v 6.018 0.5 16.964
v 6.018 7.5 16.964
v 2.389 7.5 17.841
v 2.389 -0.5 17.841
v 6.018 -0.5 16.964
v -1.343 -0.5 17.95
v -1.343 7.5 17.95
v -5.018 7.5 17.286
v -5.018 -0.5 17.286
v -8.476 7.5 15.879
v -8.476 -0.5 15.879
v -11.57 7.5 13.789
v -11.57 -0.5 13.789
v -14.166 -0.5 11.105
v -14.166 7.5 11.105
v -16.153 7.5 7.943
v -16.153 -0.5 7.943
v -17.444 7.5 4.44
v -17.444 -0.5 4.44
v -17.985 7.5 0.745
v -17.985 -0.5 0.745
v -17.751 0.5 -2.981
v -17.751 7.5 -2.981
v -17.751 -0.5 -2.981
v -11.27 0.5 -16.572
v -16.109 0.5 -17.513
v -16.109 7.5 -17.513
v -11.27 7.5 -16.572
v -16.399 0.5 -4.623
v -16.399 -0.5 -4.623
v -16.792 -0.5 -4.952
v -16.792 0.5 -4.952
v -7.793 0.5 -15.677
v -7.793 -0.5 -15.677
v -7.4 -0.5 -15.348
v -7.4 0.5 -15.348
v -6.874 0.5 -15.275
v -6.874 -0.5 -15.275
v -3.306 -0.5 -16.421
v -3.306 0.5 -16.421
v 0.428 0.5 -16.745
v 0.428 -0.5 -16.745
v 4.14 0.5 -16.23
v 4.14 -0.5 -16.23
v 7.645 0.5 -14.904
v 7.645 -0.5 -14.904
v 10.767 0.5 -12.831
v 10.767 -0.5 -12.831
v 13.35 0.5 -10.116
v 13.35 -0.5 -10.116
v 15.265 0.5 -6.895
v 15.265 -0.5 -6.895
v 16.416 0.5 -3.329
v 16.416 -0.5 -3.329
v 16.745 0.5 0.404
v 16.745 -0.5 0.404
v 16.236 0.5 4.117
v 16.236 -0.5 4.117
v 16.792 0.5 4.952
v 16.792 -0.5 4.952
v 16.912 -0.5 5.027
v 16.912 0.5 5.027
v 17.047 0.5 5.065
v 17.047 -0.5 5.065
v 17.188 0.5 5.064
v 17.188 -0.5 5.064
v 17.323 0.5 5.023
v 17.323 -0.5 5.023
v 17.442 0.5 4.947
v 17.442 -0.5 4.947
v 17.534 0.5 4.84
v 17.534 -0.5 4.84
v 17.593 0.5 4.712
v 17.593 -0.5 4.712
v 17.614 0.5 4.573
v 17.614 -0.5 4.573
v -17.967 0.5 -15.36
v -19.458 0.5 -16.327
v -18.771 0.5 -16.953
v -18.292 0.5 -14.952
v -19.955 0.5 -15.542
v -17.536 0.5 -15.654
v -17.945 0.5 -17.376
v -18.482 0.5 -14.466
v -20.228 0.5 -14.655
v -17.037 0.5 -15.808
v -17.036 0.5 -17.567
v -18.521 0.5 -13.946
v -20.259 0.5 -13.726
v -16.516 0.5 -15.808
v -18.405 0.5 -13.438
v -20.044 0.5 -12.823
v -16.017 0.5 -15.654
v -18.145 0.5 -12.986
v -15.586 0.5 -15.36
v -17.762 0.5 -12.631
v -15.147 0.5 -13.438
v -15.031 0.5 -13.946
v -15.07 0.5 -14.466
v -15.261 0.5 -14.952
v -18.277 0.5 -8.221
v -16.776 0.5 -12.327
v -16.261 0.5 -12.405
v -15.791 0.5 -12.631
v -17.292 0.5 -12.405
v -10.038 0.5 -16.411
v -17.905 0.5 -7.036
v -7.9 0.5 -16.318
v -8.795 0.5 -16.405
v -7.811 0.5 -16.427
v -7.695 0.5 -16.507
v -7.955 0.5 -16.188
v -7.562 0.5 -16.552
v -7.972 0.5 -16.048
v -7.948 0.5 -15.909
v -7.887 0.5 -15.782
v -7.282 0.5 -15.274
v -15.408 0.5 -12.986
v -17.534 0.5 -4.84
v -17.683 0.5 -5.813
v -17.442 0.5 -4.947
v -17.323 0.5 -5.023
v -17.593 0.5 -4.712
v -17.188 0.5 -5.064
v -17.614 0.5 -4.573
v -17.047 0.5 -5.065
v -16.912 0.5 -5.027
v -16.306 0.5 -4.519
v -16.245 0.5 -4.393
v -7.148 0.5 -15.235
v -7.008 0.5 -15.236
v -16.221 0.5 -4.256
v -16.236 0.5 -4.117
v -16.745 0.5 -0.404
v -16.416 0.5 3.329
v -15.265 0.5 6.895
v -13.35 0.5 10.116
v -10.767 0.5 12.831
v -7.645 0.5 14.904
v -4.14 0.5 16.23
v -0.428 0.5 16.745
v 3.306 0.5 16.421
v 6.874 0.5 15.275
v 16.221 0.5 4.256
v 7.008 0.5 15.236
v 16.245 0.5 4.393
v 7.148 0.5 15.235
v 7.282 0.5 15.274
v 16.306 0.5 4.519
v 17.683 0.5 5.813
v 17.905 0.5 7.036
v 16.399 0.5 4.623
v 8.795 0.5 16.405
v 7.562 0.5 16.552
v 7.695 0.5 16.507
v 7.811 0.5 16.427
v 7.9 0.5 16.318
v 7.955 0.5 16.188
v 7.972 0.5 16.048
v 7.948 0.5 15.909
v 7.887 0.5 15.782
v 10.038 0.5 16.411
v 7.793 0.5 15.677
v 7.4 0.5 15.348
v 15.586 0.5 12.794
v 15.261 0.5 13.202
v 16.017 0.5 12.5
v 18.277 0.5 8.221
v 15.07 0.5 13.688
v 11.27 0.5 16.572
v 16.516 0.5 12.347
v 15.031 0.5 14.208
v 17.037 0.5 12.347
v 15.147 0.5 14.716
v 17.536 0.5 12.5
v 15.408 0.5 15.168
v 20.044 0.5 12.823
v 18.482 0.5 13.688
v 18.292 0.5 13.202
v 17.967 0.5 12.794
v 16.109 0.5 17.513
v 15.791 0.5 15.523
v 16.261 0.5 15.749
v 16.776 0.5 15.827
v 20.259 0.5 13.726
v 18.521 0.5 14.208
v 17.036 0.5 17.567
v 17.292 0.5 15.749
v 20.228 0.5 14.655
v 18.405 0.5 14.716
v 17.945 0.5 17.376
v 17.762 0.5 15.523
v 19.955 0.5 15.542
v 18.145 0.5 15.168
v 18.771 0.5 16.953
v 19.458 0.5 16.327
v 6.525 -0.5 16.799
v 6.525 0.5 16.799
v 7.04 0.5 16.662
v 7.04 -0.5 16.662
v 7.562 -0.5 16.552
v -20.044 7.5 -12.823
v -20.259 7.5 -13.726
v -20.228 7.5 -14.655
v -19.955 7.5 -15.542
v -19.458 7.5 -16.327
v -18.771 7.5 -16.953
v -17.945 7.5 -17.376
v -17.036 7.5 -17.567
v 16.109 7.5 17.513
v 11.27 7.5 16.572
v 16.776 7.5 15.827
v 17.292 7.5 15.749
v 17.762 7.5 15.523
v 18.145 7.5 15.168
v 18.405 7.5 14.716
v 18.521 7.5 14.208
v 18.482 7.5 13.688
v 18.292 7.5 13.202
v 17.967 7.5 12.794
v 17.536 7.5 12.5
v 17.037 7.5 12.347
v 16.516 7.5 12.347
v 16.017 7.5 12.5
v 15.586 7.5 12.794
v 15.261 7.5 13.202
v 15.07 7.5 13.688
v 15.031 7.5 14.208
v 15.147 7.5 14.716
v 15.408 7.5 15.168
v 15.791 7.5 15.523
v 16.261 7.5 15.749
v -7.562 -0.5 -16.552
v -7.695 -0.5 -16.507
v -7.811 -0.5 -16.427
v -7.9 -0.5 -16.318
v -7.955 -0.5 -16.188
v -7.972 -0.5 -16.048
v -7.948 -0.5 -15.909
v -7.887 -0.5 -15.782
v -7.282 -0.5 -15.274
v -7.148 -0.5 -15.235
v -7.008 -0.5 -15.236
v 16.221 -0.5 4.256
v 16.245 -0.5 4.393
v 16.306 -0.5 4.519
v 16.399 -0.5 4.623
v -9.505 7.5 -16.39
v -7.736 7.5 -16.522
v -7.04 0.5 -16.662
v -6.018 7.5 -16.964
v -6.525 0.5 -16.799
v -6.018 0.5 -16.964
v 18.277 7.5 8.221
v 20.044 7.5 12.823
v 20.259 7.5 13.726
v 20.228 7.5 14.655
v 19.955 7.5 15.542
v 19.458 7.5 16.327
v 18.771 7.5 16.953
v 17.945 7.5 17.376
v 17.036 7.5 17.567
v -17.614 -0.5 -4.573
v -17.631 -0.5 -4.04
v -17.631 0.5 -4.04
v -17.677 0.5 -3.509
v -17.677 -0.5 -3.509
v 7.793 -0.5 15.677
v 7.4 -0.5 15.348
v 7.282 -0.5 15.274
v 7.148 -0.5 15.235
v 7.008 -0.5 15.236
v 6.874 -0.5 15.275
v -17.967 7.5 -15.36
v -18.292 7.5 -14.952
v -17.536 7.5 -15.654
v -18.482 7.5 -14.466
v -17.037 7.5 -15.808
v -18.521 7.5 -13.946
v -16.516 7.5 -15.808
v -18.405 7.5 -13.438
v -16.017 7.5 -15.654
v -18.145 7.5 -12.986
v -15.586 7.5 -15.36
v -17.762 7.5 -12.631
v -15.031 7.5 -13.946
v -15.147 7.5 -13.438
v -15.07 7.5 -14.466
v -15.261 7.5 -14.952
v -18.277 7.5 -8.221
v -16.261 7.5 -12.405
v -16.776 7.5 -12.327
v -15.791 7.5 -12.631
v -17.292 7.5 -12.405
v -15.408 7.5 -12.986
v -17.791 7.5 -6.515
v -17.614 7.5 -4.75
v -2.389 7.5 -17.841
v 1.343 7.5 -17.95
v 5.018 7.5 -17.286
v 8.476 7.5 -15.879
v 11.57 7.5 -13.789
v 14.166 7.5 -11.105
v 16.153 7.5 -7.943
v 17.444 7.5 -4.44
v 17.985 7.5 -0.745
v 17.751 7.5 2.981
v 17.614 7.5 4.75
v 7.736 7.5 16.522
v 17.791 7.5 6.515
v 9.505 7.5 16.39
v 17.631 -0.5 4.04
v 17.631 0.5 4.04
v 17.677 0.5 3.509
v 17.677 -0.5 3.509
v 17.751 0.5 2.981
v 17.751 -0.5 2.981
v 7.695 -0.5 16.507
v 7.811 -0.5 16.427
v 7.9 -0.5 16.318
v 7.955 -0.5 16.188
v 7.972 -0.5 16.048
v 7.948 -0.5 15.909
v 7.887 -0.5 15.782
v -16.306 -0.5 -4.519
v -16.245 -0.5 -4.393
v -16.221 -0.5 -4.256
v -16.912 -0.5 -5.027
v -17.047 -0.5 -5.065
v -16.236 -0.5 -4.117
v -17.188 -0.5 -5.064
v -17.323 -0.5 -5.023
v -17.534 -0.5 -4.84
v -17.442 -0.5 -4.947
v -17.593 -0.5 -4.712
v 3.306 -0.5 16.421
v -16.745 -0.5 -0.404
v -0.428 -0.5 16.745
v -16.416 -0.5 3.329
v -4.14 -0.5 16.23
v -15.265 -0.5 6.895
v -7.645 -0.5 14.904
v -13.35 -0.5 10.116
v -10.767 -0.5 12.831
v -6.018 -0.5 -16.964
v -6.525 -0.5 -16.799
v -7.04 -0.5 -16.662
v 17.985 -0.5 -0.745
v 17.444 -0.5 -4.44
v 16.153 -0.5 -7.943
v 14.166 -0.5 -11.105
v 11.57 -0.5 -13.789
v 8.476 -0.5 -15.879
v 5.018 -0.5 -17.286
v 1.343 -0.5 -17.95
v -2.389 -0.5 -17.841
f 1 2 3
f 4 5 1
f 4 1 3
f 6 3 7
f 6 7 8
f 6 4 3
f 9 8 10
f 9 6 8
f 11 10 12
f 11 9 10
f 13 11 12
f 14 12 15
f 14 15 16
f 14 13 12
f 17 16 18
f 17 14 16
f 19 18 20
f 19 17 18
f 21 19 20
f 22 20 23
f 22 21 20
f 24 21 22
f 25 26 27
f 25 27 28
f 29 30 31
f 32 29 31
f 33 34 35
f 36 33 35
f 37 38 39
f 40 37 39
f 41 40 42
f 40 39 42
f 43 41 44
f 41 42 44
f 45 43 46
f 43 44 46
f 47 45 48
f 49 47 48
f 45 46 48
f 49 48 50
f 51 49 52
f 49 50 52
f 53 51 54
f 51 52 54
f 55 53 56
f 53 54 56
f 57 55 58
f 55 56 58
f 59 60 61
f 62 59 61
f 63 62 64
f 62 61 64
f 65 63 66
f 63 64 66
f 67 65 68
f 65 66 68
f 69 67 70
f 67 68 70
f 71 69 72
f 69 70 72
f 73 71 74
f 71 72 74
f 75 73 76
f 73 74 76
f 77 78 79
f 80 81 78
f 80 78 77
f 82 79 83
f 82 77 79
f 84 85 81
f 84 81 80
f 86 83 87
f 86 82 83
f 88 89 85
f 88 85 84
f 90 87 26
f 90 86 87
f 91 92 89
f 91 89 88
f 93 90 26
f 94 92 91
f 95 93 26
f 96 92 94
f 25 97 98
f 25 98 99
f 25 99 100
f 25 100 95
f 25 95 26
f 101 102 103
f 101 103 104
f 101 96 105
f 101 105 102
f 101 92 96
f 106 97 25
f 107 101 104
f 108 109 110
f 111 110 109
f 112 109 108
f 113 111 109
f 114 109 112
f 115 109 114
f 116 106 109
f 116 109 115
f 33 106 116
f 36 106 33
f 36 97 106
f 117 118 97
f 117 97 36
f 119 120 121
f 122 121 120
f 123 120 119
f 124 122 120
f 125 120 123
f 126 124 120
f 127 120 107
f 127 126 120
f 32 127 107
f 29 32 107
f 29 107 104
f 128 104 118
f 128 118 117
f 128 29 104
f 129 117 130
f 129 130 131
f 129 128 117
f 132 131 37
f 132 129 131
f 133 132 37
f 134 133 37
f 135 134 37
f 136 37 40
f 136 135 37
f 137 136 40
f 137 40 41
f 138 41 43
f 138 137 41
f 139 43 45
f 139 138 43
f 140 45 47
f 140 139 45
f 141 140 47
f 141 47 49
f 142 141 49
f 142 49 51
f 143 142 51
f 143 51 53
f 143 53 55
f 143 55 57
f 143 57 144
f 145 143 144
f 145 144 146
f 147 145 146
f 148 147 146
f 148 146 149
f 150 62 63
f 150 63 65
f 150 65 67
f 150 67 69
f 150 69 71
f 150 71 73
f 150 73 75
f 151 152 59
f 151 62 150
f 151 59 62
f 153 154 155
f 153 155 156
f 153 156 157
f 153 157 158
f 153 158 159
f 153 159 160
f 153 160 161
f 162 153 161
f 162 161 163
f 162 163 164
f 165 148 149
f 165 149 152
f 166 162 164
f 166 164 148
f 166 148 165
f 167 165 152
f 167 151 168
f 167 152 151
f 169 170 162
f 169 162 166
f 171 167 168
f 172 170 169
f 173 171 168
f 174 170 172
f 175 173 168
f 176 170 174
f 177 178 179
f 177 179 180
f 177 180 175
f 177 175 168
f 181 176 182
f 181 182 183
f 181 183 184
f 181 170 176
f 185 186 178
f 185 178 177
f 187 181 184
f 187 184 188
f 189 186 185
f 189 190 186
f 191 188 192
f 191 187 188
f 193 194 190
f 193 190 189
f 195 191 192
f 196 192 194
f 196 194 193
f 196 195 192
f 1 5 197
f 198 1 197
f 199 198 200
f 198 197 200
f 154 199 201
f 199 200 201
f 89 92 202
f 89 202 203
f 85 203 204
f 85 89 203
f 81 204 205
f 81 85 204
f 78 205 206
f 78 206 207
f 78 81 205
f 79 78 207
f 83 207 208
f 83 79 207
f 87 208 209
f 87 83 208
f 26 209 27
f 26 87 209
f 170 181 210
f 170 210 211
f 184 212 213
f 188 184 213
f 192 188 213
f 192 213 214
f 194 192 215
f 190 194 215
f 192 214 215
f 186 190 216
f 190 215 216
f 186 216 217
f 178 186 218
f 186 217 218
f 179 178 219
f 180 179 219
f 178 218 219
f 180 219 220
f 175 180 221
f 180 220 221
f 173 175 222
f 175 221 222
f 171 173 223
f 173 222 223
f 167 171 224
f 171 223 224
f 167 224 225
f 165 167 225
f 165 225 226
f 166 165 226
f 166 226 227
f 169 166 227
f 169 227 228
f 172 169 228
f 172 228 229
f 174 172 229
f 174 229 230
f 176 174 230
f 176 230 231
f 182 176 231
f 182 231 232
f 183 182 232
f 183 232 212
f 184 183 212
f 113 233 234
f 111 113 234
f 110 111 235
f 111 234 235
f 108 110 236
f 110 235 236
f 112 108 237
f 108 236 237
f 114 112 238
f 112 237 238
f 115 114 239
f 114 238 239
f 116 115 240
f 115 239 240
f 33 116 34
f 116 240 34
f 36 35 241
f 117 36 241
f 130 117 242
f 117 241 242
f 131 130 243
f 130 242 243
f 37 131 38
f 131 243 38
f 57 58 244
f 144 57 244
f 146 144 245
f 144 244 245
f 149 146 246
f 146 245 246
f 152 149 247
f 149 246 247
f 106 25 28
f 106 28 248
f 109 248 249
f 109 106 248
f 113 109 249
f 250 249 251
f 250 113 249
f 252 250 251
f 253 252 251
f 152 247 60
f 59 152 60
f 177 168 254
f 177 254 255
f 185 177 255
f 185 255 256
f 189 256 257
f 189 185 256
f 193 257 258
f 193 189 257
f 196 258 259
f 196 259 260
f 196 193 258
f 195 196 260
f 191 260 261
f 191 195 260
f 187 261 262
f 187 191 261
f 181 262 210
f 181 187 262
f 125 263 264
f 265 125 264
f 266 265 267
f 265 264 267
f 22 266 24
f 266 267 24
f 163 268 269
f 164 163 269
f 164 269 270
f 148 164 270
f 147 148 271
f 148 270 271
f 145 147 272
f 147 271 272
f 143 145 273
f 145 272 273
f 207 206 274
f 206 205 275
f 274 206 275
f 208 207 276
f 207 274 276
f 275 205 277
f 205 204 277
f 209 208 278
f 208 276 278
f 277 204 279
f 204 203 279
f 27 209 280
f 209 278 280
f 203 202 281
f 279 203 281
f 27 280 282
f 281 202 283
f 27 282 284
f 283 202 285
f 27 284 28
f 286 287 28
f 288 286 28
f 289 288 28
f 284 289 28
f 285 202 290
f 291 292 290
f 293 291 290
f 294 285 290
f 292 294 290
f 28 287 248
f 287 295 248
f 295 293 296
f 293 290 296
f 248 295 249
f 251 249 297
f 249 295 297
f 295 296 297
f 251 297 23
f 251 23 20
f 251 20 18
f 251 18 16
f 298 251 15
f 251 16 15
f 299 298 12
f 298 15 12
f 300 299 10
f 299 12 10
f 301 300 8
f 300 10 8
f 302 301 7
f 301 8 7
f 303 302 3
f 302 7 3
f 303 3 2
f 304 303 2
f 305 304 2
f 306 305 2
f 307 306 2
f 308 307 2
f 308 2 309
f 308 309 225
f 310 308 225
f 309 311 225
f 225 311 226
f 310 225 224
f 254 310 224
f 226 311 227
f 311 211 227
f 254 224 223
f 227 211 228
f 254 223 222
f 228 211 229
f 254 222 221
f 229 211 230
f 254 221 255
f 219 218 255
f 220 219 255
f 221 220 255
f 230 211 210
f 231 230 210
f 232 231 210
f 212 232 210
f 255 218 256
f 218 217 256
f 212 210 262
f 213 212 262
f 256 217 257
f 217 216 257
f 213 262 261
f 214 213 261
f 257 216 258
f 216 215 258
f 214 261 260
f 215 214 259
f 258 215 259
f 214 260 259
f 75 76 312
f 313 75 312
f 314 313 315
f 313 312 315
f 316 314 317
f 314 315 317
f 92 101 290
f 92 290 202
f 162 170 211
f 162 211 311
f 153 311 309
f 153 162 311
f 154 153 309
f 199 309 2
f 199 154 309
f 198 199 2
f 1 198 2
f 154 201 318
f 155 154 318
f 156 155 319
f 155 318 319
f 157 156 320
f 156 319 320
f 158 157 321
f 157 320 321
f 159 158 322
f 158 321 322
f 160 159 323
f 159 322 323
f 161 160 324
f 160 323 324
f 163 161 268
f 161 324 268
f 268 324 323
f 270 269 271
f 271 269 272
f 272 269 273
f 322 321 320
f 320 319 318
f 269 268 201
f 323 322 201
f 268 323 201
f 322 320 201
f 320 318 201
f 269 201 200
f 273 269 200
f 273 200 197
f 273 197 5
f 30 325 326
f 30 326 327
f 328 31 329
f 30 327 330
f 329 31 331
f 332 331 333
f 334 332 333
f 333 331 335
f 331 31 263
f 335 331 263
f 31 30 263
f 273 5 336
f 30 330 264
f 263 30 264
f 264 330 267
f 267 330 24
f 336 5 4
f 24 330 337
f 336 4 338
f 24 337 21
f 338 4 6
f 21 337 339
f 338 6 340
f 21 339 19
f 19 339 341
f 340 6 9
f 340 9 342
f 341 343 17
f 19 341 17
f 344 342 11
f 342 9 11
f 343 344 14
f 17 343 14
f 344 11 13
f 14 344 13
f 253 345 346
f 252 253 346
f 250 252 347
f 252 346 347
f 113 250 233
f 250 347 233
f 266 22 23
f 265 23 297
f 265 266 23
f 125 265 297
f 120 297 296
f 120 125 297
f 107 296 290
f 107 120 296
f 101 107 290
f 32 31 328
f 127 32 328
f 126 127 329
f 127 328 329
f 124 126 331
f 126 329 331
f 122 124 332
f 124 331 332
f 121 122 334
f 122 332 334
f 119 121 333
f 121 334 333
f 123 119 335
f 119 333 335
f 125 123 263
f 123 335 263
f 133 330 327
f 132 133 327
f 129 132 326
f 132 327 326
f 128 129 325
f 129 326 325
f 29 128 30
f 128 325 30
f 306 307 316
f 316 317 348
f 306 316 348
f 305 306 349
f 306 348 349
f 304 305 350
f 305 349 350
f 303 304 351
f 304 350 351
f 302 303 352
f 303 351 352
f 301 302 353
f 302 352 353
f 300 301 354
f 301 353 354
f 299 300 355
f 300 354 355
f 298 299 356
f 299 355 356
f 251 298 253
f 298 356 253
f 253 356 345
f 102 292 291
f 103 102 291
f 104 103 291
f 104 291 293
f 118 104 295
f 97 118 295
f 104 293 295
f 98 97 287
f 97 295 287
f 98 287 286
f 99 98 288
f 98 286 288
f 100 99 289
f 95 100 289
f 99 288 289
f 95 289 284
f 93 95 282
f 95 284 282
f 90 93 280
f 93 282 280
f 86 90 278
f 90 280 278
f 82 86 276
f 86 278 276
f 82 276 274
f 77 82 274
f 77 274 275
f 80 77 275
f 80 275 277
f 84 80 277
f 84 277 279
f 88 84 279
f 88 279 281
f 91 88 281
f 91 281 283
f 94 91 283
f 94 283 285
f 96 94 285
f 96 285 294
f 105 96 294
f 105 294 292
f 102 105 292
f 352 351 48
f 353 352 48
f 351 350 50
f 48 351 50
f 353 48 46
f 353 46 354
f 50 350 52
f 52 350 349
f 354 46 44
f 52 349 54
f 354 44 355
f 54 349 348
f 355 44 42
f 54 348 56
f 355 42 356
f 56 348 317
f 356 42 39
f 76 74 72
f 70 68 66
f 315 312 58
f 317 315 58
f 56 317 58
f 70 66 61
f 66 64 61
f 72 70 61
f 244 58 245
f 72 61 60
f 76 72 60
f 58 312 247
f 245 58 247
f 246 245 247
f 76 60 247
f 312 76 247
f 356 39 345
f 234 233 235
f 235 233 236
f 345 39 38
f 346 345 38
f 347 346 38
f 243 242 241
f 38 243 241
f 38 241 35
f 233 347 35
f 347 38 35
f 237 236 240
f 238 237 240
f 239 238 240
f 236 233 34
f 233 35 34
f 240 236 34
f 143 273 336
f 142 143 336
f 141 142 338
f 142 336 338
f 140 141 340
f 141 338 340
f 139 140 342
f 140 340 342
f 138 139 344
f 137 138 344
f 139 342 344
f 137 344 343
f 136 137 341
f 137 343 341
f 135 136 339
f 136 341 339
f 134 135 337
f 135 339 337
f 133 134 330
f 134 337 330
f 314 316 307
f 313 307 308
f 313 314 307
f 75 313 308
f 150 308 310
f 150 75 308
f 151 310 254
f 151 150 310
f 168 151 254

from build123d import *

# Parameters (mm, degrees)
BOSS_EXTRUDE1_DEPTH = 7
BOSS_EXTRUDE2_START = 1
BOSS_EXTRUDE2_DEPTH = 1
SKETCH3_R           = 1.75
CUT_EXTRUDE1_DEPTH  = 29.268910739


with BuildPart() as part:
    # Sketch1 → Boss-Extrude1 (new body)
    with BuildSketch(Plane.XZ.offset(-0.5)):
        with BuildLine():
            Line((-18.277494739, -8.221105303), (-20.043904797, -12.822760829))
            ThreePointArc((-20.043904797, -12.822760829), (-19.457528855, -16.326805286), (-16.10854182, -17.512743794))
            Line((-16.10854182, -17.512743794), (-11.270061894, -16.57223857))
            ThreePointArc((-11.270061894, -16.57223857), (-8.617981259, -16.416224916), (-6.018410533, -16.964042403))
            ThreePointArc((-6.018410533, -16.964042403), (11.570176974, -13.788799976), (17.751406503, 2.981202305))
            ThreePointArc((17.751406503, 2.981202305), (17.663322313, 5.636407218), (18.277494739, 8.221105303))
            Line((18.277494739, 8.221105303), (20.043904797, 12.822760829))
            ThreePointArc((20.043904797, 12.822760829), (19.457528855, 16.326805286), (16.10854182, 17.512743794))
            Line((16.10854182, 17.512743794), (11.270061894, 16.57223857))
            ThreePointArc((11.270061894, 16.57223857), (8.617981259, 16.416224916), (6.018410533, 16.964042403))
            ThreePointArc((6.018410533, 16.964042403), (-11.570176974, 13.788799976), (-17.751406503, -2.981202305))
            ThreePointArc((-17.751406503, -2.981202305), (-17.663322313, -5.636407218), (-18.277494739, -8.221105303))
        make_face()
    extrude(amount=-BOSS_EXTRUDE1_DEPTH)

    # Sketch2 → Boss-Extrude2 (add)
    with BuildSketch(Plane.XZ.offset(-0.5).offset(BOSS_EXTRUDE2_START)):
        with BuildLine():
            Line((-7.793099068, -15.677037579), (-7.400434194, -15.347552628))
            ThreePointArc((-7.400434194, -15.347552628), (-7.14763906, -15.235302983), (-6.873851261, -15.274617153))
            ThreePointArc((-6.873851261, -15.274617153), (10.766716645, -12.831273242), (16.236193142, 4.117012581))
            ThreePointArc((16.236193142, 4.117012581), (16.245018994, 4.393467763), (16.39946073, 4.622930425))
            Line((16.39946073, 4.622930425), (16.792125603, 4.952415375))
            ThreePointArc((16.792125603, 4.952415375), (17.323359362, 5.02322924), (17.613508913, 4.572632804))
            ThreePointArc((17.613508913, 4.572632804), (17.650630104, 3.77415969), (17.751406503, 2.981202305))
            ThreePointArc((17.751406503, 2.981202305), (11.570176974, -13.788799976), (-6.018410533, -16.964042403))
            ThreePointArc((-6.018410533, -16.964042403), (-6.781821476, -16.72710142), (-7.561717962, -16.551890782))
            ThreePointArc((-7.561717962, -16.551890782), (-7.955084885, -16.187904005), (-7.793099068, -15.677037579))
        make_face()
        with BuildLine():
            Line((7.793099068, 15.677037579), (7.400434194, 15.347552628))
            ThreePointArc((7.400434194, 15.347552628), (7.14763906, 15.235302983), (6.873851261, 15.274617153))
            ThreePointArc((6.873851261, 15.274617153), (-10.766716645, 12.831273242), (-16.236193142, -4.117012581))
            ThreePointArc((-16.236193142, -4.117012581), (-16.245018994, -4.393467763), (-16.39946073, -4.622930425))
            Line((-16.39946073, -4.622930425), (-16.792125603, -4.952415375))
            ThreePointArc((-16.792125603, -4.952415375), (-17.323359362, -5.02322924), (-17.613508913, -4.572632804))
            ThreePointArc((-17.613508913, -4.572632804), (-17.650630104, -3.77415969), (-17.751406503, -2.981202305))
            ThreePointArc((-17.751406503, -2.981202305), (-11.570176974, 13.788799976), (6.018410533, 16.964042403))
            ThreePointArc((6.018410533, 16.964042403), (6.781821476, 16.72710142), (7.561717962, 16.551890782))
            ThreePointArc((7.561717962, 16.551890782), (7.955084885, 16.187904005), (7.793099068, 15.677037579))
        make_face()
    extrude(amount=-BOSS_EXTRUDE2_DEPTH)

    # Sketch3 → Cut-Extrude1 (cut, through all)
    with BuildSketch(Plane(origin=(0, 7.5, 0), x_dir=(-1, 0, 0), z_dir=(0, 1, 0))):
        with Locations(Location((-16.776373304, 14.077048652, 0), (0, 0, 90))):
            Circle(SKETCH3_R)
        with Locations(Location((16.776373304, -14.077048652, 0), (0, 0, 90))):
            Circle(SKETCH3_R)
    extrude(amount=-CUT_EXTRUDE1_DEPTH, mode=Mode.SUBTRACT)


solid = part.part
